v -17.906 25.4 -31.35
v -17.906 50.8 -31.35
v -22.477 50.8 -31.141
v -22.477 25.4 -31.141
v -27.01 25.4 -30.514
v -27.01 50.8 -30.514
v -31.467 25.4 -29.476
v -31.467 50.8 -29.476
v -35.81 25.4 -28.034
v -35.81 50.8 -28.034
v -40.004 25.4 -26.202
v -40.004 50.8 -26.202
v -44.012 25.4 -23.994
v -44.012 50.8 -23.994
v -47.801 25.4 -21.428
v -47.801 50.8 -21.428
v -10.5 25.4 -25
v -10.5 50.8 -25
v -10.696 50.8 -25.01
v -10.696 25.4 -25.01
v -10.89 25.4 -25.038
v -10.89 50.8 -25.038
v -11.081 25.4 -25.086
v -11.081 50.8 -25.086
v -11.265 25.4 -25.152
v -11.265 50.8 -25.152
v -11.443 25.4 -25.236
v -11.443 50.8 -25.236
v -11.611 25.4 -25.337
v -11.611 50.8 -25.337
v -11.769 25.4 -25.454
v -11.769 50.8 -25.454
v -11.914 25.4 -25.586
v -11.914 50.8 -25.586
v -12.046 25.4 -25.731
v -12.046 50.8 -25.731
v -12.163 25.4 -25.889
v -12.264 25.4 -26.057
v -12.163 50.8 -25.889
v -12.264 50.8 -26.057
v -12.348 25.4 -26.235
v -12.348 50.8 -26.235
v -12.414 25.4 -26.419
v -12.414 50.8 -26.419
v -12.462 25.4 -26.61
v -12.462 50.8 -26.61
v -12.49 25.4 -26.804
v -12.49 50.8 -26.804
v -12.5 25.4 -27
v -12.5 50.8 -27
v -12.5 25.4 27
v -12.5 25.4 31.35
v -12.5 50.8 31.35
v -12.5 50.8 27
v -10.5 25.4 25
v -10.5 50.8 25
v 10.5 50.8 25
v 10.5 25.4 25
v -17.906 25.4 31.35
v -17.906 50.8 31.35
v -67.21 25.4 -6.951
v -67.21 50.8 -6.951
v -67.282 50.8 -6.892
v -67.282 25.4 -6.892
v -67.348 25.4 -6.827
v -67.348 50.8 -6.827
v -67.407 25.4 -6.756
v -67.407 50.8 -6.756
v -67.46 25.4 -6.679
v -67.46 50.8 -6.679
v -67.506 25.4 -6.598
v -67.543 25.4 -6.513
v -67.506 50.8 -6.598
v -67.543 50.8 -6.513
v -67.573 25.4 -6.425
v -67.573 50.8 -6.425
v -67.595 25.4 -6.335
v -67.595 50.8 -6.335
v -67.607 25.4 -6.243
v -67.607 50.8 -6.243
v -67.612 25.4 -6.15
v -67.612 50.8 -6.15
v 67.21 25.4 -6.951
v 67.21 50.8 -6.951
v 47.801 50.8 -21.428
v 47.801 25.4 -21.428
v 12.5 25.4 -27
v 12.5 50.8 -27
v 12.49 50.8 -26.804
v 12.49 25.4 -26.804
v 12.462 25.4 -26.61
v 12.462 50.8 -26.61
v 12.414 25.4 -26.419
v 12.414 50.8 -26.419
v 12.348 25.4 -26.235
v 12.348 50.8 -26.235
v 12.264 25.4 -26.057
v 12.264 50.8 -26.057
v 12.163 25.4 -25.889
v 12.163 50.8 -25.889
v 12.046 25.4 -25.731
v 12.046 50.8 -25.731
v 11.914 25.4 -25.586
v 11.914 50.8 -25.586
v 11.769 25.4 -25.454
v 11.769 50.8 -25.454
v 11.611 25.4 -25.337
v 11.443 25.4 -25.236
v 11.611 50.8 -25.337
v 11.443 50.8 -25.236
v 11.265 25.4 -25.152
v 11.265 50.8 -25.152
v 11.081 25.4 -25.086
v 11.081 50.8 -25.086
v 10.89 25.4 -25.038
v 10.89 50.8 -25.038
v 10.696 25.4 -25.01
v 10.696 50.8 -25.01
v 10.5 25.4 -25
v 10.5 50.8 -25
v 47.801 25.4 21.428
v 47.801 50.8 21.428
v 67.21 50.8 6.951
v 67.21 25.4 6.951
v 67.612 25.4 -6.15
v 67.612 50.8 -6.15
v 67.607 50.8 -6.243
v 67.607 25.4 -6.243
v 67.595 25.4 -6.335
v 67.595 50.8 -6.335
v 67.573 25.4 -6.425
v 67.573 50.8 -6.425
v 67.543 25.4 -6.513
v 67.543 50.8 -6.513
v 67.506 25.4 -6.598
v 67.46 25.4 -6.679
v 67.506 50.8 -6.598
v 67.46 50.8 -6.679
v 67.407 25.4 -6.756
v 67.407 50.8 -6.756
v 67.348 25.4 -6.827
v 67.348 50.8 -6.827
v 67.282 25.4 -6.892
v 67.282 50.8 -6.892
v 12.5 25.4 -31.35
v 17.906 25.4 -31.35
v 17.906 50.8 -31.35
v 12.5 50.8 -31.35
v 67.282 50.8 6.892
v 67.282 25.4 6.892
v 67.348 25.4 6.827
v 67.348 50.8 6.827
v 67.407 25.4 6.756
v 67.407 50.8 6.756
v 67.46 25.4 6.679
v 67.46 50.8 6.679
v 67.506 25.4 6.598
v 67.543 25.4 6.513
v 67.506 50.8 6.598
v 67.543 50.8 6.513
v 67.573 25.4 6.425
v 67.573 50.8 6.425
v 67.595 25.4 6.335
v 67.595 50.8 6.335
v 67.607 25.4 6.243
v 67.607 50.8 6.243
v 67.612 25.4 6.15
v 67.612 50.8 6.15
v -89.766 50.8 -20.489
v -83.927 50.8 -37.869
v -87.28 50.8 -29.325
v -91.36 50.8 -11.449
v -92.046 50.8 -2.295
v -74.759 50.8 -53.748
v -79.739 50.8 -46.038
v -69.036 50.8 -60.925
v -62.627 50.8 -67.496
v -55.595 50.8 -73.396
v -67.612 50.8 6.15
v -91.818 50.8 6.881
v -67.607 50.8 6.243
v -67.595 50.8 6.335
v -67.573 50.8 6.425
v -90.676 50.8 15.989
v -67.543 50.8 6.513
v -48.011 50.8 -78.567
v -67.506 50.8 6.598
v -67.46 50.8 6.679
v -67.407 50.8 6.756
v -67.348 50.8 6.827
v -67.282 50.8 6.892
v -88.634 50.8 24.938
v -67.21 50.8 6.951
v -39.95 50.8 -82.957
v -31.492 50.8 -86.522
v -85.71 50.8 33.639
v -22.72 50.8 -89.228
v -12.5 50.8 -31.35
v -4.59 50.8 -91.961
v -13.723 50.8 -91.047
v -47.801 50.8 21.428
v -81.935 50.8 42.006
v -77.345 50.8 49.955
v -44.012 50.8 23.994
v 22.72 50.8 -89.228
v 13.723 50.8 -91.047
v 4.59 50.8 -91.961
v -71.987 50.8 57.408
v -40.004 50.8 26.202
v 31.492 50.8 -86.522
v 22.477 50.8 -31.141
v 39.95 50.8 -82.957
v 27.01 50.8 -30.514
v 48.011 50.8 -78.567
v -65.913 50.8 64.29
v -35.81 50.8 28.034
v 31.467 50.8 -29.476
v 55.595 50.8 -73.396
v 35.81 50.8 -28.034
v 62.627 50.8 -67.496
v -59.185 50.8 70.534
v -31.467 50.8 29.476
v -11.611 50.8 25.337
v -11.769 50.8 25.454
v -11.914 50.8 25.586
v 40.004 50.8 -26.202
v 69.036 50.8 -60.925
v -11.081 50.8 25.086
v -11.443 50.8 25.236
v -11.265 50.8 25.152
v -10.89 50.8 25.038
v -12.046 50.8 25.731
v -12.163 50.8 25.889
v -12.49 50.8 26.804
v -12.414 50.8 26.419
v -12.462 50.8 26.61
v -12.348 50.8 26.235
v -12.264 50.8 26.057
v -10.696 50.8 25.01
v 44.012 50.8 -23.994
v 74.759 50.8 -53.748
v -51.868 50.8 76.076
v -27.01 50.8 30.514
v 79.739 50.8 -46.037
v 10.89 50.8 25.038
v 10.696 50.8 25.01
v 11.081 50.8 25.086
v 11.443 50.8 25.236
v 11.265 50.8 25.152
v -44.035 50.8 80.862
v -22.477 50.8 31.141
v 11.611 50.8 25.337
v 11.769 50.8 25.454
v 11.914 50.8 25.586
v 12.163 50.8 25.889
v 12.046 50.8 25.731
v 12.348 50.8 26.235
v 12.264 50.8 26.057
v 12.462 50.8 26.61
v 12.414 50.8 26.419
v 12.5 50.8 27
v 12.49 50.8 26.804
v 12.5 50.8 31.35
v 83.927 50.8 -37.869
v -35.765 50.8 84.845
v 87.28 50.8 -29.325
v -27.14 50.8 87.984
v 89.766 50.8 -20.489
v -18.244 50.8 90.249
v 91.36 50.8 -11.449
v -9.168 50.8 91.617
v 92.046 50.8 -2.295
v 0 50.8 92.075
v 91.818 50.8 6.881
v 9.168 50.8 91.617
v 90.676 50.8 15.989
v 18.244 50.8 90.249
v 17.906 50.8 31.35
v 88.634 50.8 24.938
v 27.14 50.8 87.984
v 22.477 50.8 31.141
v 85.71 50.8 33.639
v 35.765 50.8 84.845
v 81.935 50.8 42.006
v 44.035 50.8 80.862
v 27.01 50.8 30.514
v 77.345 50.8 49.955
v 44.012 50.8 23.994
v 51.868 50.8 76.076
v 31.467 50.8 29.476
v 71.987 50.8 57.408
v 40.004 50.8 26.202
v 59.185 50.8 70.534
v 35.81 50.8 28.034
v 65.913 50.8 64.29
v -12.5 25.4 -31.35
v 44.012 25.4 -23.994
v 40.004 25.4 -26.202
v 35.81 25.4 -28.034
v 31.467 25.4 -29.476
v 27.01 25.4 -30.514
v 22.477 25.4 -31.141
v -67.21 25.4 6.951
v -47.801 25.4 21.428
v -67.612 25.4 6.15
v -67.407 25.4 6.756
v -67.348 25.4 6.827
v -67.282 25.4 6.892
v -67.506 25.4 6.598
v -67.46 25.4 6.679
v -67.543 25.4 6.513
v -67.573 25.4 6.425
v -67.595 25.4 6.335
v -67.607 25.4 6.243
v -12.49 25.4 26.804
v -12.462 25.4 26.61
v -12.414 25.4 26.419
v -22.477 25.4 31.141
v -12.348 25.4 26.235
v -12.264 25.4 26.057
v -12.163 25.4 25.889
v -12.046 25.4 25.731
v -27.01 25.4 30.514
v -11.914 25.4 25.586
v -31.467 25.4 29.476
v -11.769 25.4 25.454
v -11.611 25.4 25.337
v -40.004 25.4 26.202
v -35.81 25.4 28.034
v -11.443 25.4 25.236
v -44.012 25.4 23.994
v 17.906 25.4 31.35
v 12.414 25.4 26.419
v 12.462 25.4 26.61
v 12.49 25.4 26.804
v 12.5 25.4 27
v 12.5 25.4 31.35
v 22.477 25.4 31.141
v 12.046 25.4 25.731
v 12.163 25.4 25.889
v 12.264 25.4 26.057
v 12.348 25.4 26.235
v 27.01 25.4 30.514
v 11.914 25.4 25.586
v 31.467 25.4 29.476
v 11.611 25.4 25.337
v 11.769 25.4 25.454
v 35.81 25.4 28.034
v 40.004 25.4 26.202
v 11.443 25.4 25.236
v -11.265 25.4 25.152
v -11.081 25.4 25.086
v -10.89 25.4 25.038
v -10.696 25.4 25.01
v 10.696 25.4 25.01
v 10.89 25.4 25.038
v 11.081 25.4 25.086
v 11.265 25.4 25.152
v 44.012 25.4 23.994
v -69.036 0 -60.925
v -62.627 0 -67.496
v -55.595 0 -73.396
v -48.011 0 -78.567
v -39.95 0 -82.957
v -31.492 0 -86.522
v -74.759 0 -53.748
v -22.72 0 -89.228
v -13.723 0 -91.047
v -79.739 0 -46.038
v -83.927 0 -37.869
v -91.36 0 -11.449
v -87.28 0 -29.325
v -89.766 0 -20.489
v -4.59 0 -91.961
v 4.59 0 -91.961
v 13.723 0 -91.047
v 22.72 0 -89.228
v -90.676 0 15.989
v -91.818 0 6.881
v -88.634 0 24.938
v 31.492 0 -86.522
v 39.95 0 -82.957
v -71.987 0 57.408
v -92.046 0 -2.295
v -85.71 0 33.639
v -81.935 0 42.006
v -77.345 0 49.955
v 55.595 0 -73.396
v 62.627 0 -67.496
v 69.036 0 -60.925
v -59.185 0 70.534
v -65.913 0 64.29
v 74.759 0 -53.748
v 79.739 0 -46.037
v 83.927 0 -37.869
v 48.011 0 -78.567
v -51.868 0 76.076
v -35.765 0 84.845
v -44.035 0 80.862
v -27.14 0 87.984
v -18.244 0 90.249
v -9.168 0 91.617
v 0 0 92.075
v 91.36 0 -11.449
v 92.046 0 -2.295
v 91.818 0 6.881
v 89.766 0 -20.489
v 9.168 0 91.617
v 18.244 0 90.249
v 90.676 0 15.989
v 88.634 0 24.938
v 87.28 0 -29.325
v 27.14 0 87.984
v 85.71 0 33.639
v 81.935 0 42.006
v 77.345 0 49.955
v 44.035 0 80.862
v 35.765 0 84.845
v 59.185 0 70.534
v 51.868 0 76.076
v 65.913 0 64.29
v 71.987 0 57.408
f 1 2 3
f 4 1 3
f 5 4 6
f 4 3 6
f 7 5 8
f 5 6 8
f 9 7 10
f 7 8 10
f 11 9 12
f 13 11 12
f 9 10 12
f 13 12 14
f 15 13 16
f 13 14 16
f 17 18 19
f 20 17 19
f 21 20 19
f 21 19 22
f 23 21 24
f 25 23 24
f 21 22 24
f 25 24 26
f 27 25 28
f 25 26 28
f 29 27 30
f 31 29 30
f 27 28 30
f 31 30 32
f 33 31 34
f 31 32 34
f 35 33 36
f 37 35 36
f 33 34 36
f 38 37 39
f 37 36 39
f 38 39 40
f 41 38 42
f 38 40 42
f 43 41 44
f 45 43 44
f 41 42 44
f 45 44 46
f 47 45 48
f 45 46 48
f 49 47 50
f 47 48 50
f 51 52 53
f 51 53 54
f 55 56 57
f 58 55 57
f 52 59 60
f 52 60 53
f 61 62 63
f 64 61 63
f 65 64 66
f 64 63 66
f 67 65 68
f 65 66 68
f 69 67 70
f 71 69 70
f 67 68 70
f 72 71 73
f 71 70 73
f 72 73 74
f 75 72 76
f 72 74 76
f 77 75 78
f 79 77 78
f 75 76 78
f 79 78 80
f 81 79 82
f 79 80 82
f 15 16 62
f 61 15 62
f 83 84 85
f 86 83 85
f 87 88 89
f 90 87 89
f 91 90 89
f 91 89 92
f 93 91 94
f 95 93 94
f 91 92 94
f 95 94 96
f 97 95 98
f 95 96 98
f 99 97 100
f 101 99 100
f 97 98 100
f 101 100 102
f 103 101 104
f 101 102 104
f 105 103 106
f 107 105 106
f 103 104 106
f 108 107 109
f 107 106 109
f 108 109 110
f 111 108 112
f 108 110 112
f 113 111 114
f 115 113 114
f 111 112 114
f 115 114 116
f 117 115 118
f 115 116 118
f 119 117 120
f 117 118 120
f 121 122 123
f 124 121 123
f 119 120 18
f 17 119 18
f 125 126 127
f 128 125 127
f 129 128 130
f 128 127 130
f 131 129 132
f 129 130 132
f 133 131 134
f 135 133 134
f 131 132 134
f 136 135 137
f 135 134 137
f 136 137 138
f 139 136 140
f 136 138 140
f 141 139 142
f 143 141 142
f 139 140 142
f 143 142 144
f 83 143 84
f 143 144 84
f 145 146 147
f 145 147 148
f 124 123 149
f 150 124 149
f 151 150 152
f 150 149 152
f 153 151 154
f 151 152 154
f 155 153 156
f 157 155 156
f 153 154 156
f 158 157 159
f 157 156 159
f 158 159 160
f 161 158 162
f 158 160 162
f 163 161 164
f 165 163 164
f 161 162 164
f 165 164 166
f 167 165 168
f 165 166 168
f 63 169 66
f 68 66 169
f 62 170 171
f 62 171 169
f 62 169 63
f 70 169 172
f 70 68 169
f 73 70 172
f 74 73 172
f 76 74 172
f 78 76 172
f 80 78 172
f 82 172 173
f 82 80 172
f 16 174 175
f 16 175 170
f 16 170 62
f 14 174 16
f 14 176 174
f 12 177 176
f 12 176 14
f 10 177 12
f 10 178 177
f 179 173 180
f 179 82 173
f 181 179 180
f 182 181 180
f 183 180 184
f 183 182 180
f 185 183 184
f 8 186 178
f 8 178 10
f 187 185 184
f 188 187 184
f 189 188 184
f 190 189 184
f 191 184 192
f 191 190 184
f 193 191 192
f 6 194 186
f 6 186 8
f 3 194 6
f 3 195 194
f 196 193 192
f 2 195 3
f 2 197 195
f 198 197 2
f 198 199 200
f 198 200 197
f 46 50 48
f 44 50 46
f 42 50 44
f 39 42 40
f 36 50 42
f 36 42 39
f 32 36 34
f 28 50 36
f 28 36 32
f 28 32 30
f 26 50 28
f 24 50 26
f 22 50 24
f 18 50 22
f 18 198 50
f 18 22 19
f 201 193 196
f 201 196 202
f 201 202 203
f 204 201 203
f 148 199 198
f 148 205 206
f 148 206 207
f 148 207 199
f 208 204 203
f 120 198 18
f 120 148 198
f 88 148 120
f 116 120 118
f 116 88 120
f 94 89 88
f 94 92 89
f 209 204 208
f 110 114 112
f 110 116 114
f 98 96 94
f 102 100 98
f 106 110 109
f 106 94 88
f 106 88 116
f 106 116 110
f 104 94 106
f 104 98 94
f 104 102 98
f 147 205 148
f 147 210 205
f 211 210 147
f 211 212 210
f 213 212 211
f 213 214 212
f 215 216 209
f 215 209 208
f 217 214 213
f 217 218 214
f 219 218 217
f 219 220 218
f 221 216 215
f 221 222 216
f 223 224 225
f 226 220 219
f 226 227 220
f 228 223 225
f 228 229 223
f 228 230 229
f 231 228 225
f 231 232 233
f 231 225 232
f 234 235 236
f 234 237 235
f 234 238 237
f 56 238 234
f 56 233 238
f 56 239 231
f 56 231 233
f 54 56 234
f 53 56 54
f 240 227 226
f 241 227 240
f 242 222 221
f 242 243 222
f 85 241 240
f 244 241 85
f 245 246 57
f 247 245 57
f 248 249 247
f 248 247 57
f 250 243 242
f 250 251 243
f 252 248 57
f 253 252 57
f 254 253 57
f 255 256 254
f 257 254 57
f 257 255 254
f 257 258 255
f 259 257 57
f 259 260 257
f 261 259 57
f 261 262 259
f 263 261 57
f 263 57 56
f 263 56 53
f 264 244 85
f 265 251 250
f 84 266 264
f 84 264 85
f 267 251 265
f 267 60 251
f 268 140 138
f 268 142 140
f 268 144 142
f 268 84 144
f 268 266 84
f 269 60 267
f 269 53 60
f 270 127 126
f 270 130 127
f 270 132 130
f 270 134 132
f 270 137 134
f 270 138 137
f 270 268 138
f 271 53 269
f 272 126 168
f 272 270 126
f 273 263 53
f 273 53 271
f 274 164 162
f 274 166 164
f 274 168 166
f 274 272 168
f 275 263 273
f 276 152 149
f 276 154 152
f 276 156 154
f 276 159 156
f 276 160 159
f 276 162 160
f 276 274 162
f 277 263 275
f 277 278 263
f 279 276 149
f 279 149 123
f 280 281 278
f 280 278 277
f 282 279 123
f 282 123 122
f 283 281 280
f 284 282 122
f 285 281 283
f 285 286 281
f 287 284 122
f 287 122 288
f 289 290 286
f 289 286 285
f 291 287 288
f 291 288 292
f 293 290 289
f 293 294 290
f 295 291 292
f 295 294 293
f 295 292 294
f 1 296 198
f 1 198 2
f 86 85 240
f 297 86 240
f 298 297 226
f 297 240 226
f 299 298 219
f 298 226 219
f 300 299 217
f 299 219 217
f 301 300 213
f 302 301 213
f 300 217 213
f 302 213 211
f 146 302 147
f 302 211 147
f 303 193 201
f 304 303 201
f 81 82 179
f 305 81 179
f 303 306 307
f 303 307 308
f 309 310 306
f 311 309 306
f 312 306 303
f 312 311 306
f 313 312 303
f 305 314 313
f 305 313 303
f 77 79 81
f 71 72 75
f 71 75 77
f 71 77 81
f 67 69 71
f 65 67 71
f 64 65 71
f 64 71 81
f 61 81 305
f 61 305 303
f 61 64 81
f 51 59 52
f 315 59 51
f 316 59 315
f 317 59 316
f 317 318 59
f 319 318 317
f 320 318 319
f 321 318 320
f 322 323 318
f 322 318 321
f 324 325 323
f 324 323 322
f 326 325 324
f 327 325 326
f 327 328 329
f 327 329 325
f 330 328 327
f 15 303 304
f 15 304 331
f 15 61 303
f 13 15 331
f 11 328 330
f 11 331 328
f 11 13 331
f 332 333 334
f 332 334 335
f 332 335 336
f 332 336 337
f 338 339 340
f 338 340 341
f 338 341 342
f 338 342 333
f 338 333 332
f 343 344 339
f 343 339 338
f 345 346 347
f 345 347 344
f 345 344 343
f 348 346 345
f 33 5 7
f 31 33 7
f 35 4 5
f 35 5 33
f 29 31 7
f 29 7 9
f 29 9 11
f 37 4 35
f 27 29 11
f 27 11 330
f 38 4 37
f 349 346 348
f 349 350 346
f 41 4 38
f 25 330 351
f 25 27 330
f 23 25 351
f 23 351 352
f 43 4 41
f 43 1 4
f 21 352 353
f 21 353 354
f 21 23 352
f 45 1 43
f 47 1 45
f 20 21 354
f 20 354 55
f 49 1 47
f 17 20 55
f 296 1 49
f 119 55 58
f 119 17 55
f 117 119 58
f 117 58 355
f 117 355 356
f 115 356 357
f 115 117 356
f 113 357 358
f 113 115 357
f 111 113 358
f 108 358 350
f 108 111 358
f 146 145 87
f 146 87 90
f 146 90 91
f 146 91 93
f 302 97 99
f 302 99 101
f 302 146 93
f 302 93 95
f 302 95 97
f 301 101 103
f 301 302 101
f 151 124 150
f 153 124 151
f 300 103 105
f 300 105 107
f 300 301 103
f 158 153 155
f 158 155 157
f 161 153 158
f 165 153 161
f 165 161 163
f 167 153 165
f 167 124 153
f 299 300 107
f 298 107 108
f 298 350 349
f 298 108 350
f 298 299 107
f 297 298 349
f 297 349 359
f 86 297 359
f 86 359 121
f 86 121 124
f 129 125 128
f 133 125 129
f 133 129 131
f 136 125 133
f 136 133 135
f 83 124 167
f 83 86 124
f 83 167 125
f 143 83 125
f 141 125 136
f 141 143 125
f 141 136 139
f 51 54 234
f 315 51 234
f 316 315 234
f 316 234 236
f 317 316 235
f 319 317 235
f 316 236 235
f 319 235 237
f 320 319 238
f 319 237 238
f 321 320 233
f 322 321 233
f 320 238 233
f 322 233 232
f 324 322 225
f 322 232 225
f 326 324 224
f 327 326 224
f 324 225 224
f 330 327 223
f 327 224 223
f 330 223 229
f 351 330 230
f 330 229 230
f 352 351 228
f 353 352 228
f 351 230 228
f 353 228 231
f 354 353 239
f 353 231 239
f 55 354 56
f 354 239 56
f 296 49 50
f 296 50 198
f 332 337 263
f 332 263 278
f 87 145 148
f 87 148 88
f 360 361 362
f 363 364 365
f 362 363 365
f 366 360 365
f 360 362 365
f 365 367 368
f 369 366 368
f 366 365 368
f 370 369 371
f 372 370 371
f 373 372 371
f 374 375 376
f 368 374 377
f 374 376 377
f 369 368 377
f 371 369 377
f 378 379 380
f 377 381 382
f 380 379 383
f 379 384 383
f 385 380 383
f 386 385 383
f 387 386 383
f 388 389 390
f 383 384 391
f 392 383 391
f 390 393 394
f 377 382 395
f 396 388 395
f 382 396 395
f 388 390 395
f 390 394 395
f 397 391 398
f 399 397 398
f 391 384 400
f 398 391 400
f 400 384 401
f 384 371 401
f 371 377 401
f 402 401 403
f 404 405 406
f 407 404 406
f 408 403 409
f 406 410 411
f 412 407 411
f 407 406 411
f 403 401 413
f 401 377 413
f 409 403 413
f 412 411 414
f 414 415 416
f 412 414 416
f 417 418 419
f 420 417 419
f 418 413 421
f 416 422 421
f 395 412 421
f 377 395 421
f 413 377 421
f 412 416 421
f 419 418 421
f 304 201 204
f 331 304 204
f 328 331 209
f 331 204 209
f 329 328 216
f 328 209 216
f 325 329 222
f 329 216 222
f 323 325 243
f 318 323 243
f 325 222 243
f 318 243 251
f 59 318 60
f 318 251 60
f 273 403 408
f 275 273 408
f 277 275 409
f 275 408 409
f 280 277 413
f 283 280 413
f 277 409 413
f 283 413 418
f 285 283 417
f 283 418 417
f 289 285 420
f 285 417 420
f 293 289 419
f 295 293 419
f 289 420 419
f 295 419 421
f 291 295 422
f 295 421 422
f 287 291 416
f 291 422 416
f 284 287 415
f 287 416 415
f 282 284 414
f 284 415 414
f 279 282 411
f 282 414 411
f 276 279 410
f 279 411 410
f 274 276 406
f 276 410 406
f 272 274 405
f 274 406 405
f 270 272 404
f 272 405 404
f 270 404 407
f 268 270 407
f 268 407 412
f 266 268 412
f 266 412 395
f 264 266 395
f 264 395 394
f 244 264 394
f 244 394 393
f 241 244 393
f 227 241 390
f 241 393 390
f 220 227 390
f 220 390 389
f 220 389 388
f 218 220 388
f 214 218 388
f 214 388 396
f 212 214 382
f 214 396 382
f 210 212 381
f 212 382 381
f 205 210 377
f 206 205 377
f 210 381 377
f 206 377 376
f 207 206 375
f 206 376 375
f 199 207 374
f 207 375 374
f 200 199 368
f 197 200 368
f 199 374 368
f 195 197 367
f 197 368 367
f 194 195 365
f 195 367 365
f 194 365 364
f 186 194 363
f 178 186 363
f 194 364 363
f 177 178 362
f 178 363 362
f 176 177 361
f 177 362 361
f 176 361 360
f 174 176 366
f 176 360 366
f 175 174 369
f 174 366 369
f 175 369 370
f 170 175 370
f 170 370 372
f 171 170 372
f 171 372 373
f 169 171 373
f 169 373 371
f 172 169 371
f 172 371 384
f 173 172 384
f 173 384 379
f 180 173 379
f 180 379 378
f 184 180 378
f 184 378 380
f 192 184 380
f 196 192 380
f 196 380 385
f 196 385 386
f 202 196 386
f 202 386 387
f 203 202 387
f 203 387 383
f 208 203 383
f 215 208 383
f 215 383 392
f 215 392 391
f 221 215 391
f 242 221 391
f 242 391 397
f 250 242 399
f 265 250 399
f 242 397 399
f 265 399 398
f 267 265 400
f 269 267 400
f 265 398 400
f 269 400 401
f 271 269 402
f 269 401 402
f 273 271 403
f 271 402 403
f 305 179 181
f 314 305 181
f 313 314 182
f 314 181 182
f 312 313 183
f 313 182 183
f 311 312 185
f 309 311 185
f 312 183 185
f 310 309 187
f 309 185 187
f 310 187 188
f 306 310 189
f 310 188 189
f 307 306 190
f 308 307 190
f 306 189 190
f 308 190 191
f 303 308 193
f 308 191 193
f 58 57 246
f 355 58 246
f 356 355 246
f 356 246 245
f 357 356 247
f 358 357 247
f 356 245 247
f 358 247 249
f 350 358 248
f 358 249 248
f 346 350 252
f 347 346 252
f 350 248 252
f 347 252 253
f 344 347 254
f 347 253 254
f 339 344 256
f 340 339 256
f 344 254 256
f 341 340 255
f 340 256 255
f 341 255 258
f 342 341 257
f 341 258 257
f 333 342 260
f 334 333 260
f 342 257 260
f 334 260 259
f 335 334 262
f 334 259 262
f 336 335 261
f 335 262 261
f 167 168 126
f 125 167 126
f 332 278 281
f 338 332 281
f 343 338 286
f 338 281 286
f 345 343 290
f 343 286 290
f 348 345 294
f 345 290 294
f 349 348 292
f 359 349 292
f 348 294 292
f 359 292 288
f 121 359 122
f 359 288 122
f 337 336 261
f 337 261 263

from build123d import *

# Parameters (mm, degrees)
SKETCH1_R           = 92.075
BOSS_EXTRUDE1_DEPTH = 50.8
CUT_EXTRUDE1_DEPTH  = 25.4


with BuildPart() as part:
    # Sketch1 → Boss-Extrude1 (new body)
    with BuildSketch(Plane(origin=(0, 0, 0), x_dir=(1, 0, 0), z_dir=(0, 1, 0))):
        with Locations(Location((0, 0, 0), (0, 0, 270))):
            Circle(SKETCH1_R)
    extrude(amount=BOSS_EXTRUDE1_DEPTH)

    # Sketch2 → Cut-Extrude1 (cut)
    with BuildSketch(Plane(origin=(0, 50.8, 0), x_dir=(1, 0, 0), z_dir=(0, 1, 0))):
        with BuildLine():
            Line((-67.611774054, 6.149716593), (-67.611774054, 4.988825845))
            Line((-67.611774054, 4.988825845), (-67.611774054, -4.988825845))
            Line((-67.611774054, -4.988825845), (-67.611774054, -6.149716593))
            ThreePointArc((-67.611774054, -6.149716593), (-67.505615069, -6.598100625), (-67.209677573, -6.95128467))
            Line((-67.209677573, -6.95128467), (-47.801200772, -21.428403847))
            ThreePointArc((-47.801200772, -21.428403847), (-33.655307467, -28.804821632), (-17.906024822, -31.35))
            Line((-17.906024822, -31.35), (-12.5, -31.35))
            Line((-12.5, -31.35), (-12.5, -27))
            ThreePointArc((-12.5, -27), (-11.914213562, -25.585786438), (-10.5, -25))
            Line((-10.5, -25), (-0.667840434, -25))
            Line((-0.667840434, -25), (0.667840434, -25))
            Line((0.667840434, -25), (10.5, -25))
            ThreePointArc((10.5, -25), (11.914213562, -25.585786438), (12.5, -27))
            Line((12.5, -27), (12.5, -31.35))
            Line((12.5, -31.35), (17.906024822, -31.35))
            ThreePointArc((17.906024822, -31.35), (33.655307467, -28.804821632), (47.801200772, -21.428403847))
            Line((47.801200772, -21.428403847), (67.209677573, -6.95128467))
            ThreePointArc((67.209677573, -6.95128467), (67.505615069, -6.598100625), (67.611774054, -6.149716593))
            Line((67.611774054, -6.149716593), (67.611774054, -4.988825845))
            Line((67.611774054, -4.988825845), (67.611774054, 4.988825845))
            Line((67.611774054, 4.988825845), (67.611774054, 6.149716593))
            ThreePointArc((67.611774054, 6.149716593), (67.505615069, 6.598100625), (67.209677573, 6.95128467))
            Line((67.209677573, 6.95128467), (47.801200772, 21.428403847))
            ThreePointArc((47.801200772, 21.428403847), (33.655307467, 28.804821632), (17.906024822, 31.35))
            Line((17.906024822, 31.35), (12.5, 31.35))
            Line((12.5, 31.35), (12.5, 27))
            ThreePointArc((12.5, 27), (11.914213562, 25.585786438), (10.5, 25))
            Line((10.5, 25), (0.667840434, 25))
            Line((0.667840434, 25), (-0.667840434, 25))
            Line((-0.667840434, 25), (-10.5, 25))
            ThreePointArc((-10.5, 25), (-11.914213562, 25.585786438), (-12.5, 27))
            Line((-12.5, 27), (-12.5, 31.35))
            Line((-12.5, 31.35), (-17.906024822, 31.35))
            ThreePointArc((-17.906024822, 31.35), (-33.655307467, 28.804821632), (-47.801200772, 21.428403847))
            Line((-47.801200772, 21.428403847), (-67.209677573, 6.95128467))
            ThreePointArc((-67.209677573, 6.95128467), (-67.505615069, 6.598100625), (-67.611774054, 6.149716593))
        make_face()
    extrude(amount=-CUT_EXTRUDE1_DEPTH, mode=Mode.SUBTRACT)


solid = part.part
